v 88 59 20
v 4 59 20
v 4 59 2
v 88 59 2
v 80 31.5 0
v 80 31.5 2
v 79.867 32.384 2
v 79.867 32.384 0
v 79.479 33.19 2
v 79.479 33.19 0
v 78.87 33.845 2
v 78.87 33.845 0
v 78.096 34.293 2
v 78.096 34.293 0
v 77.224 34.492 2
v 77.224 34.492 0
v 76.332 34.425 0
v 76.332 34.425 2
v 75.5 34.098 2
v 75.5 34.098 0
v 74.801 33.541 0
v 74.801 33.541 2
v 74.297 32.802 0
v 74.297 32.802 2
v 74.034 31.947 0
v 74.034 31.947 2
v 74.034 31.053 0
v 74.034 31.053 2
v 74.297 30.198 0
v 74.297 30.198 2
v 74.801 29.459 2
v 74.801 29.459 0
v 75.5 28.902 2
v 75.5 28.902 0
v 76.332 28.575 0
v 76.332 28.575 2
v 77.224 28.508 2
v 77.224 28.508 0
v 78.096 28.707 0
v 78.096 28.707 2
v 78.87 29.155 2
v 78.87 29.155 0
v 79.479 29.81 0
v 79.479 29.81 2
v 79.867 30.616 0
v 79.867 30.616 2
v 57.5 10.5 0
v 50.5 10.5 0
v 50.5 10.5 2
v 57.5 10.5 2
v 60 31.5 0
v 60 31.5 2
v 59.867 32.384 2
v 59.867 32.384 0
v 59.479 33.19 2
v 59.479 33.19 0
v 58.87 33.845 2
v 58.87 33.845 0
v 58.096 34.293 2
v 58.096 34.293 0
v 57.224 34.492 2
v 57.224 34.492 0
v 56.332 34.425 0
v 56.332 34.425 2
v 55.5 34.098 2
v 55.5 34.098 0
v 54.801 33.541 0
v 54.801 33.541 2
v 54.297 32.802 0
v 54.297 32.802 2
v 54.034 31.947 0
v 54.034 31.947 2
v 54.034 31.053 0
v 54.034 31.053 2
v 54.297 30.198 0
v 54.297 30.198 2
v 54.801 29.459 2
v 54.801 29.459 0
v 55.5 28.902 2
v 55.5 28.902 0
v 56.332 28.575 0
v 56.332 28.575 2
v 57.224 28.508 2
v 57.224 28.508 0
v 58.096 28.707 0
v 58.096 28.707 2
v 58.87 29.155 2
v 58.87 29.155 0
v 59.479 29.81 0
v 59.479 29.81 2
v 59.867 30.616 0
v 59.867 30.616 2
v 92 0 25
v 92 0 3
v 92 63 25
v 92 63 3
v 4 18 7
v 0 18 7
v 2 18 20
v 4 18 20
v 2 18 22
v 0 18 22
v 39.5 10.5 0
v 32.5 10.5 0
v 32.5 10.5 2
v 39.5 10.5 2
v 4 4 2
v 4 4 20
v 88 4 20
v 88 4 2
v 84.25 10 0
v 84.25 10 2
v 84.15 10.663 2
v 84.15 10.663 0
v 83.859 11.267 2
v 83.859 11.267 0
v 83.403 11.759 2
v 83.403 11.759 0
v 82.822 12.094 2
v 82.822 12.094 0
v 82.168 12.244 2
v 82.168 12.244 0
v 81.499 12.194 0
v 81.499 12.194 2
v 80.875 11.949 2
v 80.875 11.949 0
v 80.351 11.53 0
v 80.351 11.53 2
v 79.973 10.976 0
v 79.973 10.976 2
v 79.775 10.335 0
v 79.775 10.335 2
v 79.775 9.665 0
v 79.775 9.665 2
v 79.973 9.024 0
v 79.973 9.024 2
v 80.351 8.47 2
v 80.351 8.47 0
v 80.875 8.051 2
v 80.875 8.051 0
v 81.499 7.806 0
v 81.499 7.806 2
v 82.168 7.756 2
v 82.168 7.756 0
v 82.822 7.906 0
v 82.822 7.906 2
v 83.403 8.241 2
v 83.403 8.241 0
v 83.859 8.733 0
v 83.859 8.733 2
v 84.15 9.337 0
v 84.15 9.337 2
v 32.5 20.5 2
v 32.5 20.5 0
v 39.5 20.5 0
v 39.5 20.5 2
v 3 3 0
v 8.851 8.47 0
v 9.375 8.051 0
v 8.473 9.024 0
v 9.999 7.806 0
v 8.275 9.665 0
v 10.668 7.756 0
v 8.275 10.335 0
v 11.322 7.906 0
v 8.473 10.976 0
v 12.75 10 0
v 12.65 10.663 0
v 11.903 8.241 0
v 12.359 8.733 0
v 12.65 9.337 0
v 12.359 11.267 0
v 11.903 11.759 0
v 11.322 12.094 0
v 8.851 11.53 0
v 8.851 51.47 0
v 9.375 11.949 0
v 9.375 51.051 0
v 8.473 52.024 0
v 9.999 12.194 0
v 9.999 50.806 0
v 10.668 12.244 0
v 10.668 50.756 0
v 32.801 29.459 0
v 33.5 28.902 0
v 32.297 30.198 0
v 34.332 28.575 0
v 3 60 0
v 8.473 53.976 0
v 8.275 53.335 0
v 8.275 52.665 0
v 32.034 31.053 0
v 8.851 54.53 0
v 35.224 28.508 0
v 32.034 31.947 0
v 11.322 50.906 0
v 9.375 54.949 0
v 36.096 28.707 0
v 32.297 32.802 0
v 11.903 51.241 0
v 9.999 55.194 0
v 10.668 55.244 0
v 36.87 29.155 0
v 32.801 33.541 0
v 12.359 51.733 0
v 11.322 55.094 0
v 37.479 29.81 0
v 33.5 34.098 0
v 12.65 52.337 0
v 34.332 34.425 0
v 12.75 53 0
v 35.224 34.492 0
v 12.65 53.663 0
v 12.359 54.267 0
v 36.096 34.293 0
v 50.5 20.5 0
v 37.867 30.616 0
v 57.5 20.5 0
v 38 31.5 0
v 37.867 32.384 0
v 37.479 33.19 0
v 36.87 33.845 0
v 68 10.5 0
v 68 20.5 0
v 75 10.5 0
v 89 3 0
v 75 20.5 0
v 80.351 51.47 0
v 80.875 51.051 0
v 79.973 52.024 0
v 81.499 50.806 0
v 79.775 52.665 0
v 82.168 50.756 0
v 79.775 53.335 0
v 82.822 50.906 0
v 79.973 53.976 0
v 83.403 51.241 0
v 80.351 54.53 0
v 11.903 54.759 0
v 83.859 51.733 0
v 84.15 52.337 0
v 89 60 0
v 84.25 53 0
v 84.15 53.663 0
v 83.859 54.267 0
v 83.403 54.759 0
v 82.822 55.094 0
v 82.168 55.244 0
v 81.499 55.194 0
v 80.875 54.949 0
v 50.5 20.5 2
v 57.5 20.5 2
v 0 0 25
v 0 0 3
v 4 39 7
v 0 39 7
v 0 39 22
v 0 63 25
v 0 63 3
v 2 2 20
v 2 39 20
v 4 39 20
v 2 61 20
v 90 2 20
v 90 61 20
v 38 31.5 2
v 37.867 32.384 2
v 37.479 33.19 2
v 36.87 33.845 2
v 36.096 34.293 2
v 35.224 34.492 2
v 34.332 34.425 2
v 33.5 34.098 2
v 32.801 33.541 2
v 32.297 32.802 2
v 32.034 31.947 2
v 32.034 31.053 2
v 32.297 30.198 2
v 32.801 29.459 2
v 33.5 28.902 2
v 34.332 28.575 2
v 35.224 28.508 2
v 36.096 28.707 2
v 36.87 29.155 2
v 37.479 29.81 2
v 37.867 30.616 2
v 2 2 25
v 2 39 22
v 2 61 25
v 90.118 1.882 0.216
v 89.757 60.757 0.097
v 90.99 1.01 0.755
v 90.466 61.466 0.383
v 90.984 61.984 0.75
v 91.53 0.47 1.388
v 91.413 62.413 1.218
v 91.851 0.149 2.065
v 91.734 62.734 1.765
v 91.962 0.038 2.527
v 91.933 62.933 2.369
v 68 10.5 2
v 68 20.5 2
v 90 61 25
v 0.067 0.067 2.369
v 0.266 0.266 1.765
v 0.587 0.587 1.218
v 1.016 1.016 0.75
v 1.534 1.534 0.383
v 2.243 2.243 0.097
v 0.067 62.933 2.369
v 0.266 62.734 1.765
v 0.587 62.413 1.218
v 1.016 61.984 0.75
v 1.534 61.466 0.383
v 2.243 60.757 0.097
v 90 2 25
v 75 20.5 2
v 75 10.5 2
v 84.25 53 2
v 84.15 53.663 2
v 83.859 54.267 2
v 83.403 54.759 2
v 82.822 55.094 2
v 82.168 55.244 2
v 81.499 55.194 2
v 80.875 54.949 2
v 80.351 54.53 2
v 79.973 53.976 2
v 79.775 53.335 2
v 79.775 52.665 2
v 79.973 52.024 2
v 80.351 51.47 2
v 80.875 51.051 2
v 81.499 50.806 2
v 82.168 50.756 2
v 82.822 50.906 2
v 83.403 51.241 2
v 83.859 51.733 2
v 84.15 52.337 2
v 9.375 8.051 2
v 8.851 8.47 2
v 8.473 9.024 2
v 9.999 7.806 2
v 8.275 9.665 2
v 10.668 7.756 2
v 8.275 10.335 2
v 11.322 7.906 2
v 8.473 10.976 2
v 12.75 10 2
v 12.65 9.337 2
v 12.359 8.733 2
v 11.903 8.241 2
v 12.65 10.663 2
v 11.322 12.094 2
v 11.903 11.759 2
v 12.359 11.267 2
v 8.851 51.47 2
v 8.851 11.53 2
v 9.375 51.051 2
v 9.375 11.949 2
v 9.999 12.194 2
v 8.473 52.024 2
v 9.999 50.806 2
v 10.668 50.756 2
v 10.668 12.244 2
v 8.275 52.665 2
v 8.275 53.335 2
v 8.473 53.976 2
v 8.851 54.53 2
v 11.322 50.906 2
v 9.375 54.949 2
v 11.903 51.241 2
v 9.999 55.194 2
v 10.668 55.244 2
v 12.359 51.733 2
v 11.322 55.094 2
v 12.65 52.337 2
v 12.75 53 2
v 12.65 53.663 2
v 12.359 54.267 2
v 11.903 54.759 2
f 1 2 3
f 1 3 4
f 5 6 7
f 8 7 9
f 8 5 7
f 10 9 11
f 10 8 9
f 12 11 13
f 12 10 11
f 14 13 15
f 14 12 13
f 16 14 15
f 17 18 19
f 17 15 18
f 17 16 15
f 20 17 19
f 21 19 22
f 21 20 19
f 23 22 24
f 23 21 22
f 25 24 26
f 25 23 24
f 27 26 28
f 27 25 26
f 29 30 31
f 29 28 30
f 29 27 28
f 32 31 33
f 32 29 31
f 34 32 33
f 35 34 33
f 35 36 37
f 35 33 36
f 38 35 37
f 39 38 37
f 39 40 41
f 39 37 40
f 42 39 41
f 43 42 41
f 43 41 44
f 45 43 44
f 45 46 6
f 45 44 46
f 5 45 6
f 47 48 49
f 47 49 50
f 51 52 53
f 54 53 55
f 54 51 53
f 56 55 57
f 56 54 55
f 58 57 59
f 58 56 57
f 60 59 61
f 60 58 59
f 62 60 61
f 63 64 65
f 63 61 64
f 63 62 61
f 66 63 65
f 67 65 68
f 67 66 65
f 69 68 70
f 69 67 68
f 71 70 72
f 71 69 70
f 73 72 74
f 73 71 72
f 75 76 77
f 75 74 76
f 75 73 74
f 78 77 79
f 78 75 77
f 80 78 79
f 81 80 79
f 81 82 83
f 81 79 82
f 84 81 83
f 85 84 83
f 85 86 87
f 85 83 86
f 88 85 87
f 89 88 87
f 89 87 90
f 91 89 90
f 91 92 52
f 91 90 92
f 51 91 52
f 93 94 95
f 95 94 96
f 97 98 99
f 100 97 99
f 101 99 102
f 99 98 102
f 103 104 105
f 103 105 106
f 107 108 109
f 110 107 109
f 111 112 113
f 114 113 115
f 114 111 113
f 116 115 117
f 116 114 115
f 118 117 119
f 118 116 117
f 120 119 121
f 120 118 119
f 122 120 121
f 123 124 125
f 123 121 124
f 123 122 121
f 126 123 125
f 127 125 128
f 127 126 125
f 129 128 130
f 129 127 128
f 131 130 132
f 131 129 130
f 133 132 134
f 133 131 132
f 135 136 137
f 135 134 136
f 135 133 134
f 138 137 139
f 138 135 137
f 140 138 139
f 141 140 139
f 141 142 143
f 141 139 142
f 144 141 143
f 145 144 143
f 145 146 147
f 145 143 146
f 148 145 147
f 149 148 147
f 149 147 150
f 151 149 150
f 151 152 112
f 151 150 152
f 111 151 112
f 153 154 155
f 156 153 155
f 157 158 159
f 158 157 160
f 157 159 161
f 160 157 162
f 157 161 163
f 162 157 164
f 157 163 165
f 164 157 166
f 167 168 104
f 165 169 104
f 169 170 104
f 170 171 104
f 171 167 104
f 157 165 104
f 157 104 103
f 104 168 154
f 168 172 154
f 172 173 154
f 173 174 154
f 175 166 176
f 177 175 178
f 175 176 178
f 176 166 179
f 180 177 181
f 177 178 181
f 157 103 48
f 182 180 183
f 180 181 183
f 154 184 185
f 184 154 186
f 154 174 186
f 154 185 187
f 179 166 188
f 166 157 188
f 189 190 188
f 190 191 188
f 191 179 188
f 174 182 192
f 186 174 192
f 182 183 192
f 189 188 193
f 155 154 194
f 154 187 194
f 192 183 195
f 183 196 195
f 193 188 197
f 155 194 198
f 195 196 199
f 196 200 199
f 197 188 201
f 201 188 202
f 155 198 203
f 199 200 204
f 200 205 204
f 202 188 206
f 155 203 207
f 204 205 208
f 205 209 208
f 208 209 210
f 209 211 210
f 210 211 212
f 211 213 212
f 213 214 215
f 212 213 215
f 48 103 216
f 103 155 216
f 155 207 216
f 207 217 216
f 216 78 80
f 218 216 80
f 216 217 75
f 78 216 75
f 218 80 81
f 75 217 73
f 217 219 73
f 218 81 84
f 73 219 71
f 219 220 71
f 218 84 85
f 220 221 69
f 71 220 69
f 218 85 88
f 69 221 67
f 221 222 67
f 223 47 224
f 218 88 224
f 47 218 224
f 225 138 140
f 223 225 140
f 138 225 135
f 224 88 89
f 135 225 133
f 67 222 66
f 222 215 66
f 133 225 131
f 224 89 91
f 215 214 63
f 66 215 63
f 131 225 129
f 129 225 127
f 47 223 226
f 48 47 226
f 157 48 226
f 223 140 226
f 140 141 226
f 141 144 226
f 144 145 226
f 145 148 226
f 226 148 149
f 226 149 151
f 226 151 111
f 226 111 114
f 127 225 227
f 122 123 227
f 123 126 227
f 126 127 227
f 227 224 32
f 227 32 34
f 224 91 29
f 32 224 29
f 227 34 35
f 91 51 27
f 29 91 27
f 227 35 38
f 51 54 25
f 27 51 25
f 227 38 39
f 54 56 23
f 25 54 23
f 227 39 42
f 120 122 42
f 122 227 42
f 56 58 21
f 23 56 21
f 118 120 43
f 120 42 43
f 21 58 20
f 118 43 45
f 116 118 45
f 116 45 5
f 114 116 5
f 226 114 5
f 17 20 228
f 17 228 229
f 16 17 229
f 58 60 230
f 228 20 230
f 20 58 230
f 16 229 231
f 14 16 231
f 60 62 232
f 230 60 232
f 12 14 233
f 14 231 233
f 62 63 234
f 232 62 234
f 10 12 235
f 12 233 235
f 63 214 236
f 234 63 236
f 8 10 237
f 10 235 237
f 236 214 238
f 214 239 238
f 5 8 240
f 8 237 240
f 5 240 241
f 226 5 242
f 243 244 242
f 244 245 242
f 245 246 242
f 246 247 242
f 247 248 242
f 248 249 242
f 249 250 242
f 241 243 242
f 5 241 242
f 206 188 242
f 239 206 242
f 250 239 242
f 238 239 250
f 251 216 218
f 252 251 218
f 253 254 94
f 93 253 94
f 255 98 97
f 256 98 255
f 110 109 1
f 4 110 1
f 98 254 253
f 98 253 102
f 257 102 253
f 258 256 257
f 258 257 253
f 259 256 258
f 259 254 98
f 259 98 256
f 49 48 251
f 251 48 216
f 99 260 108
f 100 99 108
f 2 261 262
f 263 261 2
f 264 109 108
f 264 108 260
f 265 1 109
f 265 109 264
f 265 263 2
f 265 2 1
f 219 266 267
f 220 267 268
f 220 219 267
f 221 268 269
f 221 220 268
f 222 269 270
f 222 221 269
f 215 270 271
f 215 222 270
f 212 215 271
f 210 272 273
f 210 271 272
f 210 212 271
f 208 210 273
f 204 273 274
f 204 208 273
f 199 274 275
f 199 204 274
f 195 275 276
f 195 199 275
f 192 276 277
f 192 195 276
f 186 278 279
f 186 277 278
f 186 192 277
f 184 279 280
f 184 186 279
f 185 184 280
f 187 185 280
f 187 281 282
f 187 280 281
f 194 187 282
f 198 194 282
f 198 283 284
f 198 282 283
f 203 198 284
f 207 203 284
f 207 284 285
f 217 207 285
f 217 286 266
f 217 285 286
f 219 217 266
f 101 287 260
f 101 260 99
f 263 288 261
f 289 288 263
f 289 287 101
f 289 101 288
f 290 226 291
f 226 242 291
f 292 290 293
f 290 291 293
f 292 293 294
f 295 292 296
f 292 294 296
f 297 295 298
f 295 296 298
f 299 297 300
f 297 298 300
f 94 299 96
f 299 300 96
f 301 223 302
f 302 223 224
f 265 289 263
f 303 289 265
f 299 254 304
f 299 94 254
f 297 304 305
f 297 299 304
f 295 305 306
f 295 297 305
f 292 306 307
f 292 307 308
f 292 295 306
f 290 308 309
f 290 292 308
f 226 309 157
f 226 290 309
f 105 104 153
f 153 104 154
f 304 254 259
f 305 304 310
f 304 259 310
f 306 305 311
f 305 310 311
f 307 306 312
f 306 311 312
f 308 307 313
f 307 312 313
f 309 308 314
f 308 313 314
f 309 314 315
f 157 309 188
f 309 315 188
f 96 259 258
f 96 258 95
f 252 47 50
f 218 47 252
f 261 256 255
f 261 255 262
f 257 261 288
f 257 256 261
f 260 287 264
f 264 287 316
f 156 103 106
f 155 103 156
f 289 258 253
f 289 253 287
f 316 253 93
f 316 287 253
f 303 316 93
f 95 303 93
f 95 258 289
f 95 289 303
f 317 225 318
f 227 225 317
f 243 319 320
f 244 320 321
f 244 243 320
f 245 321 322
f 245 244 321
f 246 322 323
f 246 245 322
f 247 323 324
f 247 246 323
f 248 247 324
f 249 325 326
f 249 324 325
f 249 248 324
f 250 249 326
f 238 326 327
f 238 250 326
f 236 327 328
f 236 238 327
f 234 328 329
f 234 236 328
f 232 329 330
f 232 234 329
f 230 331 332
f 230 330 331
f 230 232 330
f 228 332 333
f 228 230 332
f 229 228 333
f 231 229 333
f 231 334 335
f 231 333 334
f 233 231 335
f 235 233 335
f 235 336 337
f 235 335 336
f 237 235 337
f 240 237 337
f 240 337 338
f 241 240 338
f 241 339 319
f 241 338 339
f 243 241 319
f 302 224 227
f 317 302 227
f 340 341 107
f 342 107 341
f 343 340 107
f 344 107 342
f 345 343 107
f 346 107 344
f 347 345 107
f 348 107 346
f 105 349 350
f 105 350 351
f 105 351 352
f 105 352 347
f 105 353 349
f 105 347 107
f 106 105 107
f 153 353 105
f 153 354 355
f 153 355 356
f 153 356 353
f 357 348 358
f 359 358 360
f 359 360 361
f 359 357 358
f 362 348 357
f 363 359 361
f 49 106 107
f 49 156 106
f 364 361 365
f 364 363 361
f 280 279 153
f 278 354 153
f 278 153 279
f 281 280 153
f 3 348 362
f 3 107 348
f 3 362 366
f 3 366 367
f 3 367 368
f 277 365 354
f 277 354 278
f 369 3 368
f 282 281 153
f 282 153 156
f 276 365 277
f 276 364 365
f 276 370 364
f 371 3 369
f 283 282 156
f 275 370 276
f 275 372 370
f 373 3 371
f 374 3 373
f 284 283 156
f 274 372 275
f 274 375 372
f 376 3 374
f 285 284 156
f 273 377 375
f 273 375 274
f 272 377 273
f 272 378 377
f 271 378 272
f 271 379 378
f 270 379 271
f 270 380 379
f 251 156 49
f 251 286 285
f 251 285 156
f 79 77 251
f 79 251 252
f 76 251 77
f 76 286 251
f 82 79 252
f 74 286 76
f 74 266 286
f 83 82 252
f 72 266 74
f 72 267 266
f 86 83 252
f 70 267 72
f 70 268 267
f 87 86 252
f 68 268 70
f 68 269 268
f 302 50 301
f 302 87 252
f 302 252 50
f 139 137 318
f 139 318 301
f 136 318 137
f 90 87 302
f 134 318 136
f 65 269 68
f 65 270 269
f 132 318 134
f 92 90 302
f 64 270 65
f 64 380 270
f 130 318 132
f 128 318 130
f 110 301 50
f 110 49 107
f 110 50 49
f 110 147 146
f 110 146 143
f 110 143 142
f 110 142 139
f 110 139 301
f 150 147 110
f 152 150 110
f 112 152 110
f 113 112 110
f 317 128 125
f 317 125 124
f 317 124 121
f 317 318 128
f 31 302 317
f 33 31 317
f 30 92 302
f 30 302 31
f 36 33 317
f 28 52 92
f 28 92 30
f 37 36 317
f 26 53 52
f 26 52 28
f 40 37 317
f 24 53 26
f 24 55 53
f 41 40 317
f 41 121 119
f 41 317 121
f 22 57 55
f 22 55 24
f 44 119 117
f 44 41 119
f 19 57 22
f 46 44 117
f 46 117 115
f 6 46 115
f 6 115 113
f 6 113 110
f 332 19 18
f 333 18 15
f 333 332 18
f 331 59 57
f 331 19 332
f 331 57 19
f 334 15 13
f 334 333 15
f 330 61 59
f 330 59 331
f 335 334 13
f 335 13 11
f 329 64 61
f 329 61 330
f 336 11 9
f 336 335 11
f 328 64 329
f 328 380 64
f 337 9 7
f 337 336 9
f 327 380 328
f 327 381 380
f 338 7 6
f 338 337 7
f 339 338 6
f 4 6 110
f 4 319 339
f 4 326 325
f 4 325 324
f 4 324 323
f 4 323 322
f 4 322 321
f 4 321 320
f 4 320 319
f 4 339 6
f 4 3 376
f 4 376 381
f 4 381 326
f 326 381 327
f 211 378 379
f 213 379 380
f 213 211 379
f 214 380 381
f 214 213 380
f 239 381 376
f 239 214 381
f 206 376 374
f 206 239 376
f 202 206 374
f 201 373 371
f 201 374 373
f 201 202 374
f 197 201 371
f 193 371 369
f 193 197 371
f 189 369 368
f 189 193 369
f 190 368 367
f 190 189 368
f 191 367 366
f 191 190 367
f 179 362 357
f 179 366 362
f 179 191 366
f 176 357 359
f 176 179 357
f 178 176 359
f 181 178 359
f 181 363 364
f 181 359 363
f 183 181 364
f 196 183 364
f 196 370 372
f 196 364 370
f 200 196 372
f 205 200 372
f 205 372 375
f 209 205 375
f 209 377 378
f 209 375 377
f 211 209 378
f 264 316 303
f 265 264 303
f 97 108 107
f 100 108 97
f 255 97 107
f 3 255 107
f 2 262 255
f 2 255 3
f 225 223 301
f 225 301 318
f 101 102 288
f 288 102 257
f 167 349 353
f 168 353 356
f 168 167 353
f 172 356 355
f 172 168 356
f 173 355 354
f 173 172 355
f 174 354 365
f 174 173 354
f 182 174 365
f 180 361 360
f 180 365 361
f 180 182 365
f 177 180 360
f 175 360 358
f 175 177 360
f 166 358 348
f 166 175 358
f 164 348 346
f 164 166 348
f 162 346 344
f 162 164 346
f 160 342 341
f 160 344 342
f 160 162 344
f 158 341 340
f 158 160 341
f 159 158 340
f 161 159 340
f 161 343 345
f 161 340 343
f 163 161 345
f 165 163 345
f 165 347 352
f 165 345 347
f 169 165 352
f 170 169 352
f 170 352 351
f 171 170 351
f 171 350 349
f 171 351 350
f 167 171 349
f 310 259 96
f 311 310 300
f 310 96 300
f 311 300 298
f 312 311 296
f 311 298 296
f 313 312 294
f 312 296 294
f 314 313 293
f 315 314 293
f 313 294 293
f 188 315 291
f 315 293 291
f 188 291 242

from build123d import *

# Parameters (mm, degrees)
SKETCH3_W           = 92
SKETCH3_H           = 63
SKETCH3_R           = 3
SKETCH3_R_2         = 2.25
SKETCH3_W_2         = 7
SKETCH3_H_2         = 10
BOSS_EXTRUDE3_DEPTH = 25
SKETCH4_W           = 84
SKETCH4_H           = 55
CUT_EXTRUDE1_DEPTH  = 23
SKETCH5_W           = 88
SKETCH5_H           = 59
CUT_EXTRUDE2_DEPTH  = 5
FILLET1_R           = 3
SKETCH6_W           = 15
SKETCH6_H           = 21
CUT_EXTRUDE3_DEPTH  = 5


with BuildPart() as part:
    # Sketch3 → Boss-Extrude3 (new body)
    with BuildSketch(Plane.XY):
        with Locations((46, 31.5)):
            Rectangle(SKETCH3_W, SKETCH3_H)
        with Locations((35, 31.5)):
            Circle(SKETCH3_R, mode=Mode.SUBTRACT)
        with Locations((57, 31.5)):
            Circle(SKETCH3_R, mode=Mode.SUBTRACT)
        with Locations((77, 31.5)):
            Circle(SKETCH3_R, mode=Mode.SUBTRACT)
        with Locations((82, 53)):
            Circle(SKETCH3_R_2, mode=Mode.SUBTRACT)
        with Locations((82, 10)):
            Circle(SKETCH3_R_2, mode=Mode.SUBTRACT)
        with Locations((10.5, 10)):
            Circle(SKETCH3_R_2, mode=Mode.SUBTRACT)
        with Locations((10.5, 53)):
            Circle(SKETCH3_R_2, mode=Mode.SUBTRACT)
        with Locations((71.5, 15.5)):
            Rectangle(SKETCH3_W_2, SKETCH3_H_2, mode=Mode.SUBTRACT)
        with Locations((54, 15.5)):
            Rectangle(SKETCH3_W_2, SKETCH3_H_2, mode=Mode.SUBTRACT)
        with Locations((36, 15.5)):
            Rectangle(SKETCH3_W_2, SKETCH3_H_2, mode=Mode.SUBTRACT)
    extrude(amount=BOSS_EXTRUDE3_DEPTH)

    # Sketch4 → Cut-Extrude1 (cut)
    with BuildSketch(Plane.XY.offset(25)):
        with Locations((46, 31.5)):
            Rectangle(SKETCH4_W, SKETCH4_H)
    extrude(amount=-CUT_EXTRUDE1_DEPTH, mode=Mode.SUBTRACT)

    # Sketch5 → Cut-Extrude2 (cut)
    with BuildSketch(Plane.XY.offset(25)):
        with Locations((46, 31.5)):
            Rectangle(SKETCH5_W, SKETCH5_H)
    extrude(amount=-CUT_EXTRUDE2_DEPTH, mode=Mode.SUBTRACT)

    # Fillet1
    fillet1_edges = [part.edges().sort_by_distance(p)[0] for p in [
        (0, 31.5, 0),
        (46, 63, 0),
        (92, 31.5, 0),
        (46, 0, 0),
    ]]
    fillet(fillet1_edges, radius=FILLET1_R)

    # Sketch6 → Cut-Extrude3 (cut)
    with BuildSketch(Plane.ZY):
        with Locations((14.5, 28.5)):
            Rectangle(SKETCH6_W, SKETCH6_H)
    extrude(amount=-CUT_EXTRUDE3_DEPTH, mode=Mode.SUBTRACT)


solid = part.part
